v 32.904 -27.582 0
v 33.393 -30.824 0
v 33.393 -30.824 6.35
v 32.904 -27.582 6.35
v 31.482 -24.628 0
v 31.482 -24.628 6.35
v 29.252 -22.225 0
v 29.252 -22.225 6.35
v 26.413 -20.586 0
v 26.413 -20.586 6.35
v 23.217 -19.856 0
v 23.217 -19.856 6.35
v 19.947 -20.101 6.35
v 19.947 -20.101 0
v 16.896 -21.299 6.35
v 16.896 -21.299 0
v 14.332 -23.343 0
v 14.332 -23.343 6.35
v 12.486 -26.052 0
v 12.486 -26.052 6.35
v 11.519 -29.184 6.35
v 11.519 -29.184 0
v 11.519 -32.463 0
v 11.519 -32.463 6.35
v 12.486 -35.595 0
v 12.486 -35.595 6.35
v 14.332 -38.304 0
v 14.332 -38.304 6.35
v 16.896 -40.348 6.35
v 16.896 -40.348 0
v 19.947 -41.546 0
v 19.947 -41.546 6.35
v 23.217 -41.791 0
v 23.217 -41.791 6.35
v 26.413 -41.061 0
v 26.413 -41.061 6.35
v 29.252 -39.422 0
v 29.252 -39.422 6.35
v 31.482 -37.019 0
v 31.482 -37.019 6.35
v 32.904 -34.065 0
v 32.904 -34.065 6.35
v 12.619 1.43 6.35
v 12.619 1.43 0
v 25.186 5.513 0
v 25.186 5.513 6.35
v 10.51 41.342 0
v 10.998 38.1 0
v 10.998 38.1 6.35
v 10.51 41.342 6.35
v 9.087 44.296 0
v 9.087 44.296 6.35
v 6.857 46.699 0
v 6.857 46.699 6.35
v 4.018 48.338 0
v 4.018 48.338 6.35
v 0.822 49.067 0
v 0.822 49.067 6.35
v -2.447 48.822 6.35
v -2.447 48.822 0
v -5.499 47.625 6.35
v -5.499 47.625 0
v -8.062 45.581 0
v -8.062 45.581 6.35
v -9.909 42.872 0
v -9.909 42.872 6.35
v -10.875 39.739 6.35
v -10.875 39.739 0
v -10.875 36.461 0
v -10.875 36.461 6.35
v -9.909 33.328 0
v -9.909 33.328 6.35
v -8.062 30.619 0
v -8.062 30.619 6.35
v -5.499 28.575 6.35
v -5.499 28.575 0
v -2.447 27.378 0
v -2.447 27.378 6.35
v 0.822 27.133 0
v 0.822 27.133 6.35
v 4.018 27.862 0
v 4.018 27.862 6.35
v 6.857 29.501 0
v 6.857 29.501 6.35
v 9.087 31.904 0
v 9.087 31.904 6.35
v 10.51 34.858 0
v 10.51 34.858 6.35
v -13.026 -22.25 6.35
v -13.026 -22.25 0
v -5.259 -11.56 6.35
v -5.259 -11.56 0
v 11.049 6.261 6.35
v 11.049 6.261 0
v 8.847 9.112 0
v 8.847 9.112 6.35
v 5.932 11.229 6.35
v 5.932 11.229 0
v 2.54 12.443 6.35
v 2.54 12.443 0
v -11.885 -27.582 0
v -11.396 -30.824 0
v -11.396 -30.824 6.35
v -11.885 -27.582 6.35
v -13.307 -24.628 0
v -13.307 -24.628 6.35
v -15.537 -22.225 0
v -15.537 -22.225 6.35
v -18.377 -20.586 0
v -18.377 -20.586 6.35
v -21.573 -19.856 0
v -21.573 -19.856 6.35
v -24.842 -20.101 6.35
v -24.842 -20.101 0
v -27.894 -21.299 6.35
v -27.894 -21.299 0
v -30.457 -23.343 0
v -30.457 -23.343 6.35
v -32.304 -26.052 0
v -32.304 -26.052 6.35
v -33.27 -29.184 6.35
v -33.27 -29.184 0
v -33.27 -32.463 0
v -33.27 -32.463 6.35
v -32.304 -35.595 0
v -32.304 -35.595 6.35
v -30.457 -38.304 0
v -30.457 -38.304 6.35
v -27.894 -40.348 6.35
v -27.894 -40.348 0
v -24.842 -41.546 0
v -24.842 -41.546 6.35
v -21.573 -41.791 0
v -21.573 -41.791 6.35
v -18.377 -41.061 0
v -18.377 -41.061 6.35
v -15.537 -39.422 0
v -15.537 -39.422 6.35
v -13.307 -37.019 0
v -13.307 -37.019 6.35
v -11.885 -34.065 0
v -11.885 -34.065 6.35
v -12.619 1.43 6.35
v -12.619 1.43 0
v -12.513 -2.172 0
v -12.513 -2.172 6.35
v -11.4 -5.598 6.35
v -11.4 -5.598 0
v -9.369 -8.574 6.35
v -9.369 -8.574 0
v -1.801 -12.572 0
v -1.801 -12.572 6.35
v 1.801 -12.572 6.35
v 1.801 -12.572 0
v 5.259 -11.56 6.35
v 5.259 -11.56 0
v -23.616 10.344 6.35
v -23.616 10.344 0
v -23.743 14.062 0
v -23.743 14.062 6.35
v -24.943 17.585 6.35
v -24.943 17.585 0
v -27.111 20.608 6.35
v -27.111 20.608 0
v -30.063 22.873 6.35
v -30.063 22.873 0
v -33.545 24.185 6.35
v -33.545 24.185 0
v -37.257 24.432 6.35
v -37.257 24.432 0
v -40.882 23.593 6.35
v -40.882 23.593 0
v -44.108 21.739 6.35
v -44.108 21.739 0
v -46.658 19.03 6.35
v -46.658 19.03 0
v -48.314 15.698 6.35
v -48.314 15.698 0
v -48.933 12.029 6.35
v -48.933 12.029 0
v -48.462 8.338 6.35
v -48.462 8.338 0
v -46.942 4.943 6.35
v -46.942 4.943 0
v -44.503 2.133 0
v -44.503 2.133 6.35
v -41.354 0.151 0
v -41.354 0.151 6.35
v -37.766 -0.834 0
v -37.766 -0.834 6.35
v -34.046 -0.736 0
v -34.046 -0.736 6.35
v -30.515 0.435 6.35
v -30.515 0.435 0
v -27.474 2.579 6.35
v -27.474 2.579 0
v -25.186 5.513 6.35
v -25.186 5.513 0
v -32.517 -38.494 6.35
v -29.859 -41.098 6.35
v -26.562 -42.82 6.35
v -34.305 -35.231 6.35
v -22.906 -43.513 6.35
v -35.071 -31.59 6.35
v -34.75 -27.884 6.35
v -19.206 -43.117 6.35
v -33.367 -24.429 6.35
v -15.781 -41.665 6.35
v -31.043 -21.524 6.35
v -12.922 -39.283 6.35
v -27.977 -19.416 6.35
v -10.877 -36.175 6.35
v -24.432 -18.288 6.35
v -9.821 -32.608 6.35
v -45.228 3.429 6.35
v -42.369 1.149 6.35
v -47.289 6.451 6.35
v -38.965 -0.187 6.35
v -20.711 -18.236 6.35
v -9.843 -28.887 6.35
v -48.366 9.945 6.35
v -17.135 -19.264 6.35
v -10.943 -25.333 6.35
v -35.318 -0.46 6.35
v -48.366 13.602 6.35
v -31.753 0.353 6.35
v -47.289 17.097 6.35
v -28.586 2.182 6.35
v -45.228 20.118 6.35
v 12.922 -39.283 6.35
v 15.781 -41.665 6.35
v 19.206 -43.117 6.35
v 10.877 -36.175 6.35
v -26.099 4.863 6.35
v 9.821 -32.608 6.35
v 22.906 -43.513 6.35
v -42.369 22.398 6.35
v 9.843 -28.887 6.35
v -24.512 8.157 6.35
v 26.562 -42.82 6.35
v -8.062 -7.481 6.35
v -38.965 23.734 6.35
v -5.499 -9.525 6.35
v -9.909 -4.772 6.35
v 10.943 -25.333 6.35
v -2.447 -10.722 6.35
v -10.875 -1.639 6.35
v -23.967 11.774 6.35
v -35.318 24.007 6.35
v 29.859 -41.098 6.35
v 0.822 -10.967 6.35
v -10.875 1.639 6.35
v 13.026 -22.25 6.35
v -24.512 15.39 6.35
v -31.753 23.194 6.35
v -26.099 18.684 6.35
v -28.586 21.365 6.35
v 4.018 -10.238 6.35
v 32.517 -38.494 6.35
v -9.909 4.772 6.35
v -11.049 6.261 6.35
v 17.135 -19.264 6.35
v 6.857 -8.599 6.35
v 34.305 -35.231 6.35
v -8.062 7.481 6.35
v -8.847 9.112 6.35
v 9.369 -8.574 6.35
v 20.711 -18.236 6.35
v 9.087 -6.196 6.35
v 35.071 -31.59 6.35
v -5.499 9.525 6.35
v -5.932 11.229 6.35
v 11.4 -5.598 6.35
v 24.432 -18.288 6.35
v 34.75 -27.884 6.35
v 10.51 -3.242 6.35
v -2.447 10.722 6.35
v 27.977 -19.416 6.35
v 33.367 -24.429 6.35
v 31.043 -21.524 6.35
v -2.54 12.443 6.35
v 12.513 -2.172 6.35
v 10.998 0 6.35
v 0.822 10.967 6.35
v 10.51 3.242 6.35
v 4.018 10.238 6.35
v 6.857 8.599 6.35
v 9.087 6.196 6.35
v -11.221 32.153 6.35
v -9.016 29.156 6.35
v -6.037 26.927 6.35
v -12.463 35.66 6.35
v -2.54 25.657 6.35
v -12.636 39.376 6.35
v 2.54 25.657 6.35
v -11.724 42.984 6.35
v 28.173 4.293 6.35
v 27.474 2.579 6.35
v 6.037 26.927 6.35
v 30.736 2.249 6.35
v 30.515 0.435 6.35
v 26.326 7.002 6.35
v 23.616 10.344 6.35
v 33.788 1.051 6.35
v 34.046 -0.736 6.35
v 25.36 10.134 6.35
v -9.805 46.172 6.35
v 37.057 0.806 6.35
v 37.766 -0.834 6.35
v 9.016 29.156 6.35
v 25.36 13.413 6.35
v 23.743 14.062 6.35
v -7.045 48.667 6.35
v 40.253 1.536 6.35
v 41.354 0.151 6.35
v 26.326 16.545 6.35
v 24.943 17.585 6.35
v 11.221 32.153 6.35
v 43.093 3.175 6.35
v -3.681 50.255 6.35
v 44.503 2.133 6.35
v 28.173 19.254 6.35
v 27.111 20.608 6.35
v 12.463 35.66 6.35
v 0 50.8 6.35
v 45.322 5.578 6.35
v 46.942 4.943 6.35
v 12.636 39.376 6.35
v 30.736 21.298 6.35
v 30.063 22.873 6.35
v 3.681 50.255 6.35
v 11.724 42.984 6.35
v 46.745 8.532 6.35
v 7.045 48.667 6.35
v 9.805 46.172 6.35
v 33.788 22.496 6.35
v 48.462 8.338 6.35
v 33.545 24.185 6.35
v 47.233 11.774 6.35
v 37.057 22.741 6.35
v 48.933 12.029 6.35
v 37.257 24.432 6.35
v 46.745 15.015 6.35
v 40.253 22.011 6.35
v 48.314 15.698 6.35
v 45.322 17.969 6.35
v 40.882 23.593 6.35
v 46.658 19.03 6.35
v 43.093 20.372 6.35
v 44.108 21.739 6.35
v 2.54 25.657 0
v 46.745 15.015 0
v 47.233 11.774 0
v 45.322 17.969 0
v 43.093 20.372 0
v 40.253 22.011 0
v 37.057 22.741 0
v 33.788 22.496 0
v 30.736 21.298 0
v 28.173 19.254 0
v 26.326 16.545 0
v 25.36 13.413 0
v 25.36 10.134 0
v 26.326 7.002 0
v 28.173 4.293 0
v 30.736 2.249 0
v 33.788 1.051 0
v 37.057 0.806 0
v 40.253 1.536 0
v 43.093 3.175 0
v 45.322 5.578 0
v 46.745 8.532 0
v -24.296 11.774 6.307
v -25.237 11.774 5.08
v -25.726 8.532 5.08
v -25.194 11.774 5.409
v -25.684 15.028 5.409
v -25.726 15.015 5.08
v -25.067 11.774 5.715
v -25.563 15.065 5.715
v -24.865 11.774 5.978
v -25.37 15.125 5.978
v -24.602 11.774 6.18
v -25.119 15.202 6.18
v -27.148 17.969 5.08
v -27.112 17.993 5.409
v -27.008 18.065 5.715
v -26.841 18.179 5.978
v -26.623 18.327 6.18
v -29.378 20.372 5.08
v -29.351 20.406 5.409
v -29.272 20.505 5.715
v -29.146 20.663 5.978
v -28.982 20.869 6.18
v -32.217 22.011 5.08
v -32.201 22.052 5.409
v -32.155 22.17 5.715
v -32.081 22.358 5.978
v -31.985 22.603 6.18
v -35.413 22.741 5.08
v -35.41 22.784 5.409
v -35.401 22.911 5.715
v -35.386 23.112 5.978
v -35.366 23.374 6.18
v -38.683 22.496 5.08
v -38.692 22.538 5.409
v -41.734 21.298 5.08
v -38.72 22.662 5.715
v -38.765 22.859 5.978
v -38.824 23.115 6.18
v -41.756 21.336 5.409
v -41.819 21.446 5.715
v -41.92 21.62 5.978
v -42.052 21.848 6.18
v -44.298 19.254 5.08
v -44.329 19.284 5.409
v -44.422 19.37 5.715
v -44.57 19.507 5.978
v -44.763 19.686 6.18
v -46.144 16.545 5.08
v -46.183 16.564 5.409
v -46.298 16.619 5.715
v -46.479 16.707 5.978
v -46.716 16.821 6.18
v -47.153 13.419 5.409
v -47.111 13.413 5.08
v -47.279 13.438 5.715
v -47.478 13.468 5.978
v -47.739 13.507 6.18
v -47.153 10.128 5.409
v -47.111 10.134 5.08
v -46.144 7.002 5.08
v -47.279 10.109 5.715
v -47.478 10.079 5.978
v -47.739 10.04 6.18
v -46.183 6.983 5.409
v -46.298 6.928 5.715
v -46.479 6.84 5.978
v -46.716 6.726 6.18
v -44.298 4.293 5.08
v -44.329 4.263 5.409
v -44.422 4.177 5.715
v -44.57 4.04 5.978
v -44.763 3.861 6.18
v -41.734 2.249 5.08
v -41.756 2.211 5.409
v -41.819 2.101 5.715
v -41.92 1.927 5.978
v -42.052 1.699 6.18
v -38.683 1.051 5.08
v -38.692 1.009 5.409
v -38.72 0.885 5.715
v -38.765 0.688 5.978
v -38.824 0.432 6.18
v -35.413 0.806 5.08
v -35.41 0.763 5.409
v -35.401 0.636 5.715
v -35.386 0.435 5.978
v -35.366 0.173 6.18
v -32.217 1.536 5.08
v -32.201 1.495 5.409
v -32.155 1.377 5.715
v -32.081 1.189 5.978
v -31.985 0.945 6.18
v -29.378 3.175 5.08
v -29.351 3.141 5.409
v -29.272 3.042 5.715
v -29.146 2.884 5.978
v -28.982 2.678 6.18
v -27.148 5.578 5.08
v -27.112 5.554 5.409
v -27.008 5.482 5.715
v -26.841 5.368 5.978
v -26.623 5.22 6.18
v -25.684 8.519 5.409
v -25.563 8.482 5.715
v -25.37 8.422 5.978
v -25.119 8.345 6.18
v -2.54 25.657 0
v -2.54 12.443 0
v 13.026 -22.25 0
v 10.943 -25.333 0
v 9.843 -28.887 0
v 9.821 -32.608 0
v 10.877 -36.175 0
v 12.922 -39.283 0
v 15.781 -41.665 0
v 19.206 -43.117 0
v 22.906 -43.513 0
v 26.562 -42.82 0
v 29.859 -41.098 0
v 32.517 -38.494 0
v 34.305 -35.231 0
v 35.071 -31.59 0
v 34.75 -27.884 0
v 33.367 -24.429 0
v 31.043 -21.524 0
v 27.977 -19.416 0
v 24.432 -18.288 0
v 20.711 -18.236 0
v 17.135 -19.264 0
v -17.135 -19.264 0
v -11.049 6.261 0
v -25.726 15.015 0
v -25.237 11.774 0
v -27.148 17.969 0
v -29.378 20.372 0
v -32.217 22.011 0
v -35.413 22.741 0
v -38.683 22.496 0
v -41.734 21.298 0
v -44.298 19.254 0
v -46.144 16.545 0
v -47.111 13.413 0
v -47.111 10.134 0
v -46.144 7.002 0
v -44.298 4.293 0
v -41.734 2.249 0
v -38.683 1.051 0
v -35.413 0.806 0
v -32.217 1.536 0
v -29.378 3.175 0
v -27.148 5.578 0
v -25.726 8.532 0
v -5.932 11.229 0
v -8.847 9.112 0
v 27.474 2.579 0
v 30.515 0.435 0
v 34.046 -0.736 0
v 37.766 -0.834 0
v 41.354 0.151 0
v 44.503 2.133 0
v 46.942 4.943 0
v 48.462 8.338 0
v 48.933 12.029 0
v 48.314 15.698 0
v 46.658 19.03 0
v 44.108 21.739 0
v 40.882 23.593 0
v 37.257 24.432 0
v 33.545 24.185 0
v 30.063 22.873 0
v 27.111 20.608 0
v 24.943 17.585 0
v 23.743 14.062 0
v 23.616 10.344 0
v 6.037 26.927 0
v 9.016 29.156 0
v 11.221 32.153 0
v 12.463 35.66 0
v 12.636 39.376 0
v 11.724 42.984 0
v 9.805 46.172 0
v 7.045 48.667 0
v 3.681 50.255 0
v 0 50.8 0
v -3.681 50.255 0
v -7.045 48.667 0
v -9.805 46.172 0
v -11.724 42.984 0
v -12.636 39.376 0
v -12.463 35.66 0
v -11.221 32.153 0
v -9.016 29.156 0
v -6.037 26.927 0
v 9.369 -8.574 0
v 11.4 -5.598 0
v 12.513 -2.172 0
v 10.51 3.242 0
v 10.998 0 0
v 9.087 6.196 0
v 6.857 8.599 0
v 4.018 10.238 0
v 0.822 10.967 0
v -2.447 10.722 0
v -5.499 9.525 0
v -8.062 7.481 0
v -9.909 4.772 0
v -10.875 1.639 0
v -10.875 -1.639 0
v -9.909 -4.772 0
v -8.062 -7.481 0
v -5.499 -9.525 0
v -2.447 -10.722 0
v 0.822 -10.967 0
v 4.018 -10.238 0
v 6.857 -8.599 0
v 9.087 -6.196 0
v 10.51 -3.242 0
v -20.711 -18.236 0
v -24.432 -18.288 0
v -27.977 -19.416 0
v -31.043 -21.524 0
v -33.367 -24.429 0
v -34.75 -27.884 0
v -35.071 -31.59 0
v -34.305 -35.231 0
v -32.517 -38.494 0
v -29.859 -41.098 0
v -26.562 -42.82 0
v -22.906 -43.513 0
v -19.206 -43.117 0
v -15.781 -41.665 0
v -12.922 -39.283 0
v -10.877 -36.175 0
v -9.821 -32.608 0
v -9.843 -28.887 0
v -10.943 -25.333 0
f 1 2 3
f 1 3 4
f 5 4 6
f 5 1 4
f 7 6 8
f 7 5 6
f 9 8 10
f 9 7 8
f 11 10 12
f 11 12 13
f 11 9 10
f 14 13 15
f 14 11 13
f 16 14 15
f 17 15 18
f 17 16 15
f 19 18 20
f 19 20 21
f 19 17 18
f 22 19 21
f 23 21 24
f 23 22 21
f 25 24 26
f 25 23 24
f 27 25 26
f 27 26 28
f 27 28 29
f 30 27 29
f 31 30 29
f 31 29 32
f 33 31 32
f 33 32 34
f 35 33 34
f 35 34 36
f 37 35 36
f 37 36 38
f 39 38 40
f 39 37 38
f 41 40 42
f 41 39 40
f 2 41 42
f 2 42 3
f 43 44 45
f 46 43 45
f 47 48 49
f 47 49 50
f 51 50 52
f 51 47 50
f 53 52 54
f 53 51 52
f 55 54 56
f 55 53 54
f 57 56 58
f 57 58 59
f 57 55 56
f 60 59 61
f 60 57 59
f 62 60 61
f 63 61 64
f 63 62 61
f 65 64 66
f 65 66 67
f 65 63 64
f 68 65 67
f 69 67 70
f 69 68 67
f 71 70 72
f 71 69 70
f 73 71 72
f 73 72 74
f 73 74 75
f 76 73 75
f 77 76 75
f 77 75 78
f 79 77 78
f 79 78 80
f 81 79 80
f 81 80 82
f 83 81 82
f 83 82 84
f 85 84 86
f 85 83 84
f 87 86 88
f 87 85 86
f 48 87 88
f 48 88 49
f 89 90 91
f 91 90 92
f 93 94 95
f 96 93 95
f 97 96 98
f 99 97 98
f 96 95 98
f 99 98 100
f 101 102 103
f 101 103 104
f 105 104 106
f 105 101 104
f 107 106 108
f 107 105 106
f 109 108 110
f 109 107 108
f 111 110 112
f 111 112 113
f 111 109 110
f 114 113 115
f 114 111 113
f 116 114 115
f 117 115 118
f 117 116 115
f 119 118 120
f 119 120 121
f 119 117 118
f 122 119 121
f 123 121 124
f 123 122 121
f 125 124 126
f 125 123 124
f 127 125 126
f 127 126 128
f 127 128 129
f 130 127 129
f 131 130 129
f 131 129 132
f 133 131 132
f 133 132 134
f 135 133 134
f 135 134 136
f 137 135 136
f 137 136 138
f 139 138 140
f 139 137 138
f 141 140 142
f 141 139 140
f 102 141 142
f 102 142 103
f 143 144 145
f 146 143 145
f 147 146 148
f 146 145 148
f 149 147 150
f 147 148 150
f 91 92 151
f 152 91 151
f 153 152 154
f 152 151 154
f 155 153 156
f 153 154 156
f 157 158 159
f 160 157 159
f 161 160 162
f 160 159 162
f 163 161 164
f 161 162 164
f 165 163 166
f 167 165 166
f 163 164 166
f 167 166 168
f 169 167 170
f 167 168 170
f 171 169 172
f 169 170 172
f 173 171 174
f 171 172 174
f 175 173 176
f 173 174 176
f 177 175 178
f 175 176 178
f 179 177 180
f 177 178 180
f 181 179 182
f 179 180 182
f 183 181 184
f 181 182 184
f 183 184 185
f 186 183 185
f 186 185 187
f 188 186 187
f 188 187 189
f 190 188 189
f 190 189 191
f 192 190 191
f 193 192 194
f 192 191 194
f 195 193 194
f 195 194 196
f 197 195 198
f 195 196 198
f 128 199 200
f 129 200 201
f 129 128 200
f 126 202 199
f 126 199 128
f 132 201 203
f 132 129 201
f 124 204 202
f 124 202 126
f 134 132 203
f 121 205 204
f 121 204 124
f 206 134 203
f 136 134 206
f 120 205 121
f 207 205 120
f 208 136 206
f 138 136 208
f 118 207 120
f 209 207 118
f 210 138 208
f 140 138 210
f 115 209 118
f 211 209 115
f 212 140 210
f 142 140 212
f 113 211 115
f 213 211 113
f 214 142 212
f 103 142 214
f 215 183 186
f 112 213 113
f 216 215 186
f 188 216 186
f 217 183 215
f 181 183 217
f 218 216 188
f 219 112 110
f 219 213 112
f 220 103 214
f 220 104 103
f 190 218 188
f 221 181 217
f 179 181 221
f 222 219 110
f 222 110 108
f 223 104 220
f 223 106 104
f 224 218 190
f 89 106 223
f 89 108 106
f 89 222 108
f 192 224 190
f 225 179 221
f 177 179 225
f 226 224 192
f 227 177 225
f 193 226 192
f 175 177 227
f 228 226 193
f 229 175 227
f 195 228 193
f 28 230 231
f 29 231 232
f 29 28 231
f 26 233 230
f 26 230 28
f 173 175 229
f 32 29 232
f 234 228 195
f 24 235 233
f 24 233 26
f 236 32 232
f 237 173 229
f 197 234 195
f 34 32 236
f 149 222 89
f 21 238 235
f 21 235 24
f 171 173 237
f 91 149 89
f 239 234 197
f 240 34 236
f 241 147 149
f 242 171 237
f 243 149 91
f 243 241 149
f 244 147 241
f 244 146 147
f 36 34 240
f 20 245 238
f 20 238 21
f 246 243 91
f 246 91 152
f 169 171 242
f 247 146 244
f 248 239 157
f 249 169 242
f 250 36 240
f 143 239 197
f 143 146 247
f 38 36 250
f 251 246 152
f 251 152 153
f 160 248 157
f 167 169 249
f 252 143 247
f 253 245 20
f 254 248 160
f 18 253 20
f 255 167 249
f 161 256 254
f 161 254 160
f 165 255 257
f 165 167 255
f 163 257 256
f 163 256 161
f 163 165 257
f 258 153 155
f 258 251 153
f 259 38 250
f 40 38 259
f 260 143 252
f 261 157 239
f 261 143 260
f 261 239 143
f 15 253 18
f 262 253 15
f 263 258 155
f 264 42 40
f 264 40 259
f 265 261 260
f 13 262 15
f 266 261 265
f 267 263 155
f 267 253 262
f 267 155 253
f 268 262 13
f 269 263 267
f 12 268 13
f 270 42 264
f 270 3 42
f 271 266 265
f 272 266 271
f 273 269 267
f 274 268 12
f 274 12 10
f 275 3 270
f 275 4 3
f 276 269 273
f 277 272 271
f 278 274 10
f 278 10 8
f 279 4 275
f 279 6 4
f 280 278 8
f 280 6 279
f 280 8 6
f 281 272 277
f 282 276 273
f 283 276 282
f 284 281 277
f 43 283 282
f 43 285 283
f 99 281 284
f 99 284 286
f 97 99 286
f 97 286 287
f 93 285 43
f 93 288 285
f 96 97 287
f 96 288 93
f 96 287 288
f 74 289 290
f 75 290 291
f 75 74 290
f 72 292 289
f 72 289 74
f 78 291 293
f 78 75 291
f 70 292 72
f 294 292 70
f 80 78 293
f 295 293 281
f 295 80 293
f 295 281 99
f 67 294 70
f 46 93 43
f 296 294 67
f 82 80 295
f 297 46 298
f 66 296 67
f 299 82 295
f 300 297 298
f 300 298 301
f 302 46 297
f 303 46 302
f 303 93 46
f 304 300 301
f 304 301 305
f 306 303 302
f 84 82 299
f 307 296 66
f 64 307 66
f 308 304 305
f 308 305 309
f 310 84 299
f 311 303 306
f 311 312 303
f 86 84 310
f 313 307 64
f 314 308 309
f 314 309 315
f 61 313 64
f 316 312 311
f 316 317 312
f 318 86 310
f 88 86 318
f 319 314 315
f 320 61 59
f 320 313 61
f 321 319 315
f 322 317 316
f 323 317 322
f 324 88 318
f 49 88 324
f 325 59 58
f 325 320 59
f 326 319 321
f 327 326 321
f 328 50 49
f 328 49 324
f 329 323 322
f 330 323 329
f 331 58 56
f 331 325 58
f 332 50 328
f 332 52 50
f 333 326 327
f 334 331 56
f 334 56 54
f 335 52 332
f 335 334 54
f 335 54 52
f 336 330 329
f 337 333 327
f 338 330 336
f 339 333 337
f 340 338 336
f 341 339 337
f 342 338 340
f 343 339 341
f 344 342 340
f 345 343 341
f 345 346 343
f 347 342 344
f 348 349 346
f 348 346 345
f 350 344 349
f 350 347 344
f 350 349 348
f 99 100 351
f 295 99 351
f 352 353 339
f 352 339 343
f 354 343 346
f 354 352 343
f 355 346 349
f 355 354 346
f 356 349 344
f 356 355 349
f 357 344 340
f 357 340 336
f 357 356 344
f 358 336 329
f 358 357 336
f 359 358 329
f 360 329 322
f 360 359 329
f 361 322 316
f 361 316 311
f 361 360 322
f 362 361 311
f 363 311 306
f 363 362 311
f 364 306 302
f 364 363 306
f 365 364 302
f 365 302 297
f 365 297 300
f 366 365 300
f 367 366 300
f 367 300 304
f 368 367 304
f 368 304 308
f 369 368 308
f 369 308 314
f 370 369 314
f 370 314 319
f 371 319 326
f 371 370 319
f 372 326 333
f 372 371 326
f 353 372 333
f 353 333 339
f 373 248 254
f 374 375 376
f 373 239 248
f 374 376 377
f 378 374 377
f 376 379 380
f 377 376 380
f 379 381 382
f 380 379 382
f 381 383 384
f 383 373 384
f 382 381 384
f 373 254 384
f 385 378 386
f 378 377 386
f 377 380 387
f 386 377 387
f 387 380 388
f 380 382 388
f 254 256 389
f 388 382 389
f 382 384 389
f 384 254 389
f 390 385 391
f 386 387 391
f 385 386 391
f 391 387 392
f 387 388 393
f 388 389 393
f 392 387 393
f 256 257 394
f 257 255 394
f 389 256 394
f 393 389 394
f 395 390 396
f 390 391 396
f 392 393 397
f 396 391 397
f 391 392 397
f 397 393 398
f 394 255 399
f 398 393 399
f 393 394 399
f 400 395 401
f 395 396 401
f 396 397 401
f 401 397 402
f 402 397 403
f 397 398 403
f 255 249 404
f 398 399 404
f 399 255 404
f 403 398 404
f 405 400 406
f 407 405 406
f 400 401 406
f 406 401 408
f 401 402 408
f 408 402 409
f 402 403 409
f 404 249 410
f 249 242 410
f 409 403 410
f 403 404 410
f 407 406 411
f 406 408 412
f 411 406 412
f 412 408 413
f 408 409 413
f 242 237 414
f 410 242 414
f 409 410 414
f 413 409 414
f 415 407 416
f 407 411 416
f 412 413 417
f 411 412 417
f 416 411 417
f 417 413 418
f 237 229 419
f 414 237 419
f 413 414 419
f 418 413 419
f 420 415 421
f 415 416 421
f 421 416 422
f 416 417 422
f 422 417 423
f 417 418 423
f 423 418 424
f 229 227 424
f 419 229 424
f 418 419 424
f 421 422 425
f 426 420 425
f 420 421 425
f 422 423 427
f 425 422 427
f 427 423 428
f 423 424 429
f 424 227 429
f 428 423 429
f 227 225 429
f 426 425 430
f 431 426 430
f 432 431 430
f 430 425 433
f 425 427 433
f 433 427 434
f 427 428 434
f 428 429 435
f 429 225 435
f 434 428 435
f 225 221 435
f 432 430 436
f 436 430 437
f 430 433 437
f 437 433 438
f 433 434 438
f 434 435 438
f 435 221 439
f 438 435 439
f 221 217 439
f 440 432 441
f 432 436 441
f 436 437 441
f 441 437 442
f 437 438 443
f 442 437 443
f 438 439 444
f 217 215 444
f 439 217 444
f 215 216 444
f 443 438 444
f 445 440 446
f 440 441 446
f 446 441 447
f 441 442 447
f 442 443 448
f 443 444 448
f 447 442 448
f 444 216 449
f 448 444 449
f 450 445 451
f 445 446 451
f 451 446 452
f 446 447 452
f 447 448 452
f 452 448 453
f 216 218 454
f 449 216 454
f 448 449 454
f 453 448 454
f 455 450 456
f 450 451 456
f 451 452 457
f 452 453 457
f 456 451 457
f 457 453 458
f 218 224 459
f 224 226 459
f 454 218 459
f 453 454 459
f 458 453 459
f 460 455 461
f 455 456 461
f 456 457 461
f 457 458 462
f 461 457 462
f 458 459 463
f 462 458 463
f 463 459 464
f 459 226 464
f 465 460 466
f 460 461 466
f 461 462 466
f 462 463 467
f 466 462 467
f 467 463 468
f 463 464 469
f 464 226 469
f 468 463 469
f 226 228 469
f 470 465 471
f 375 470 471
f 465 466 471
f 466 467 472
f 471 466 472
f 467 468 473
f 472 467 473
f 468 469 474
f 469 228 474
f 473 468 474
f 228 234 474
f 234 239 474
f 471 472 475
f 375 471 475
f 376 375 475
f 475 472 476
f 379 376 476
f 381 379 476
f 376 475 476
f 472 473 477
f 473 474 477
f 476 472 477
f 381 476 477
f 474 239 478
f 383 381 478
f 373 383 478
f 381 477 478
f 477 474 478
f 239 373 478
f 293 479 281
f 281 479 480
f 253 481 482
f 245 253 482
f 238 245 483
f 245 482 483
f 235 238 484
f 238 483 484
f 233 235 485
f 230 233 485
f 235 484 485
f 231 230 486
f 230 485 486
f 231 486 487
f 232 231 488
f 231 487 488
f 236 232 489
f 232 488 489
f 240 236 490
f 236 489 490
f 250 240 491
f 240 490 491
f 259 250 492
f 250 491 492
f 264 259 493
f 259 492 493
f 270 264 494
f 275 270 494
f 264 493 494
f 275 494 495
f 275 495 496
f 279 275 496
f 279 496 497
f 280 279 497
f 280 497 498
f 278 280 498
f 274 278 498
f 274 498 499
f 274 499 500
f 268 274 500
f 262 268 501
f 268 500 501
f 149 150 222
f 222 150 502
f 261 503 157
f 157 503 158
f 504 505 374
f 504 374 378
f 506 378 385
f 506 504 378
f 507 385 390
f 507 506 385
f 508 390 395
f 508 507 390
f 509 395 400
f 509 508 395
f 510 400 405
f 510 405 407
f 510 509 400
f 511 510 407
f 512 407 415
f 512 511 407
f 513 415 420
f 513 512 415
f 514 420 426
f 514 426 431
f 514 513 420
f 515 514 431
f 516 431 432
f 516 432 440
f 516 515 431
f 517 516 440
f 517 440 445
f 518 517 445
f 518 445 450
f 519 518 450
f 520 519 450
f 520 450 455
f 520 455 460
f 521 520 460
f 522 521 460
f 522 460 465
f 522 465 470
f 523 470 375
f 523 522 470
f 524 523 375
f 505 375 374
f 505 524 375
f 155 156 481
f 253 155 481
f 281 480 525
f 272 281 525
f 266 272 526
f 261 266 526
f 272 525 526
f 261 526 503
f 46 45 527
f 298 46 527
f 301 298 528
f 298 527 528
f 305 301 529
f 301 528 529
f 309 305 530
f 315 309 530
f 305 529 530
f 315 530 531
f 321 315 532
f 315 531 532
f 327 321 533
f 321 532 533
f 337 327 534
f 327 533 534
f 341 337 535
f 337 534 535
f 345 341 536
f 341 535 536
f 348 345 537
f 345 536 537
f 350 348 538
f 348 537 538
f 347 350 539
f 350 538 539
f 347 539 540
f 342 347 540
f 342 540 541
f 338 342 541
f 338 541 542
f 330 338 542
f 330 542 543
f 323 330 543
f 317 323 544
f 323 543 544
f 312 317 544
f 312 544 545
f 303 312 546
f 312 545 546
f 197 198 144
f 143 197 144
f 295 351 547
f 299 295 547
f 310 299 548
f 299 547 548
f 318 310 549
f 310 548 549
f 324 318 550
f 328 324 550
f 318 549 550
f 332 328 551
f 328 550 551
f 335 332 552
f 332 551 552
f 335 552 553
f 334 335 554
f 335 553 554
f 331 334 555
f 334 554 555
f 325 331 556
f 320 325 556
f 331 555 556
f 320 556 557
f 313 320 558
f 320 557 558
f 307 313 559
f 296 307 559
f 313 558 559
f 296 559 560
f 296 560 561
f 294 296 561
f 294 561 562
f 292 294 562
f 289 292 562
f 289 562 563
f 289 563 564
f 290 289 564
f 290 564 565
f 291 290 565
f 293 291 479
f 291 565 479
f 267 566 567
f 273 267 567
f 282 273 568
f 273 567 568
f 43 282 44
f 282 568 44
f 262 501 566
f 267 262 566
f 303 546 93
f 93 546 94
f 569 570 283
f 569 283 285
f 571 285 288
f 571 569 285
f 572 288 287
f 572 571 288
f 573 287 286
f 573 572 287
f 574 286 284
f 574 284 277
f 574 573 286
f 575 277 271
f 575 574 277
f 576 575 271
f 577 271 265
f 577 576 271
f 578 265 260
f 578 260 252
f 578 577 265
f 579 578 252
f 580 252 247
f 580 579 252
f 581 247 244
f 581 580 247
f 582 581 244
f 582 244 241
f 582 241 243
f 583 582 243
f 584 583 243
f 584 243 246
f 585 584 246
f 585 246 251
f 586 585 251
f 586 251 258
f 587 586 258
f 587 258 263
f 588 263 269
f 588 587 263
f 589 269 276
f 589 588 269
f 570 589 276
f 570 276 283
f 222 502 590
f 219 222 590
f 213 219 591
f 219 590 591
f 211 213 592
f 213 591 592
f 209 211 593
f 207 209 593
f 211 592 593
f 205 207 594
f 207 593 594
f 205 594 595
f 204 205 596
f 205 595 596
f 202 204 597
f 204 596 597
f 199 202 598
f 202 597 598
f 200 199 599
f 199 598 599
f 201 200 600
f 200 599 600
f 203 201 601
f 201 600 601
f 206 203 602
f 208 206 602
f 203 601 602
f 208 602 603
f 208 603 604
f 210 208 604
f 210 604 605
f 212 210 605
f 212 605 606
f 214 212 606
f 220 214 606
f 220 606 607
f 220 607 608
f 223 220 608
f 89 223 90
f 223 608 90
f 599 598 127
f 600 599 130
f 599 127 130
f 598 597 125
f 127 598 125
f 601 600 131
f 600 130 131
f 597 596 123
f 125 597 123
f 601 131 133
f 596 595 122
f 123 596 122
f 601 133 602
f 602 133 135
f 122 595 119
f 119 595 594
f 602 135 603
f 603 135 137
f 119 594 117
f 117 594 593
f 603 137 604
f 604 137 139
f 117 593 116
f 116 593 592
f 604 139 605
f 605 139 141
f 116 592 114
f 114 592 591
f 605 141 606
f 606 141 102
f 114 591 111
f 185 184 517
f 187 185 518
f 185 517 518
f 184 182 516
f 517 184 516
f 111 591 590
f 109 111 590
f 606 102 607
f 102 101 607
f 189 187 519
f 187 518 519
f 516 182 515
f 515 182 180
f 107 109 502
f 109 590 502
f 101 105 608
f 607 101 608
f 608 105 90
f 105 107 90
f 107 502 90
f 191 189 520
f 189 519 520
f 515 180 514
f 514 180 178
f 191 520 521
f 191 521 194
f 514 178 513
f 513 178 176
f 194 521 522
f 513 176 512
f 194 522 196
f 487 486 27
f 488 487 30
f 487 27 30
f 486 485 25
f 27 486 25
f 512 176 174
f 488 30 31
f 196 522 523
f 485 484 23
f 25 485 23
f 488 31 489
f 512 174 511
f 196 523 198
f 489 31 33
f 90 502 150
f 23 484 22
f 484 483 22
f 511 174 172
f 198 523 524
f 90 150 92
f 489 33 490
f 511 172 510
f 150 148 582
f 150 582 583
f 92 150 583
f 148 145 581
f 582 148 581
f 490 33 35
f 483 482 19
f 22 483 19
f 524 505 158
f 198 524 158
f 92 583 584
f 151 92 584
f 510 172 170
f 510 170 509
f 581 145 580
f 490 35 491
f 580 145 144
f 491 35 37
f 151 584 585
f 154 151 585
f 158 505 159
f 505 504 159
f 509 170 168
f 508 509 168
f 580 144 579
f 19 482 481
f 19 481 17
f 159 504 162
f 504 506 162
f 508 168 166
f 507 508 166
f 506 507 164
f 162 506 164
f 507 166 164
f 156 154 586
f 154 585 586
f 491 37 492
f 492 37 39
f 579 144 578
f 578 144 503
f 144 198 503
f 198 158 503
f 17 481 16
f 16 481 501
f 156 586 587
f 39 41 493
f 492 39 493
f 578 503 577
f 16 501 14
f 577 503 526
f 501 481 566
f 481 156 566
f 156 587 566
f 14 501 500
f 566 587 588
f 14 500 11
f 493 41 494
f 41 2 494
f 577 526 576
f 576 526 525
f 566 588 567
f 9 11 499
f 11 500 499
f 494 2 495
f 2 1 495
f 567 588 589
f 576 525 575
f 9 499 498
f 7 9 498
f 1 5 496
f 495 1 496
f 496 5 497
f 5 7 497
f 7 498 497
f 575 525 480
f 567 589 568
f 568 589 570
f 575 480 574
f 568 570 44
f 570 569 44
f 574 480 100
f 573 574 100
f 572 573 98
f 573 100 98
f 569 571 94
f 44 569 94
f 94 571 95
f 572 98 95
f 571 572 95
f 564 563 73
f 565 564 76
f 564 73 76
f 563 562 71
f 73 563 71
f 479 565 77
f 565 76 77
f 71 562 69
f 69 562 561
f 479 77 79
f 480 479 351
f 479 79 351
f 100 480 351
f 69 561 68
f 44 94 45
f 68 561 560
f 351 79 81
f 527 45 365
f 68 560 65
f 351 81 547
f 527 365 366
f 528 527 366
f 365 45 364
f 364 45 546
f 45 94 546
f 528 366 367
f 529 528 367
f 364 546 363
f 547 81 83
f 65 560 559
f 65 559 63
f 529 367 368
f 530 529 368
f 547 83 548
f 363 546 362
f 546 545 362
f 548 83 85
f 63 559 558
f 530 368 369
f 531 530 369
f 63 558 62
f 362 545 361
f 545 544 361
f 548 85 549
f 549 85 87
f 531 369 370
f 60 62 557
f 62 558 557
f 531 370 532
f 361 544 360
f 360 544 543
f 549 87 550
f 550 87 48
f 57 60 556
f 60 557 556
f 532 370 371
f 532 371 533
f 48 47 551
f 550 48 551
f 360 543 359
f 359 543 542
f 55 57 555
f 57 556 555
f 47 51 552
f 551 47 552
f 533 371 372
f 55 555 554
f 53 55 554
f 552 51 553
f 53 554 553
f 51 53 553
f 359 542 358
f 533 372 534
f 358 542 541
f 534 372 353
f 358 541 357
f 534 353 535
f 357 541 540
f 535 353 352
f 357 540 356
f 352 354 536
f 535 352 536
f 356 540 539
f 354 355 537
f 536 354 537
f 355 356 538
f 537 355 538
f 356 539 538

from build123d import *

# Parameters (mm, degrees)
F0_R     = 10.9982
F1_DEPTH = 6.35
F2_R     = 1.27


with BuildPart() as f1:
    # F0 (on Top) → F1 (new body)
    with BuildSketch(Plane.XY):
        with BuildLine():
            Line((-2.54, 25.656592), (-2.54, 12.443408))
            ThreePointArc((-2.54, 12.443408), (-7.464873, 10.274516), (-11.049481, 6.260908))
            Line((-11.049481, 6.260908), (-23.615966, 10.344007))
            ThreePointArc((-23.615966, 10.344007), (-48.313671, 15.698063), (-25.185772, 5.512639))
            Line((-25.185772, 5.512639), (-12.619287, 1.429541))
            ThreePointArc((-12.619287, 1.429541), (-12.078418, -3.924516), (-9.368955, -8.573954))
            Line((-9.368955, -8.573954), (-17.13547, -19.263644))
            ThreePointArc((-17.13547, -19.263644), (-29.859491, -41.098063), (-13.025663, -22.249594))
            Line((-13.025663, -22.249594), (-5.259148, -11.559903))
            ThreePointArc((-5.259148, -11.559903), (0, -12.7), (5.259148, -11.559903))
            Line((5.259148, -11.559903), (13.025663, -22.249594))
            ThreePointArc((13.025663, -22.249594), (29.859491, -41.098063), (17.13547, -19.263644))
            Line((17.13547, -19.263644), (9.368955, -8.573954))
            ThreePointArc((9.368955, -8.573954), (12.078418, -3.924516), (12.619287, 1.429541))
            Line((12.619287, 1.429541), (25.185772, 5.512639))
            ThreePointArc((25.185772, 5.512639), (48.313671, 15.698063), (23.615966, 10.344007))
            Line((23.615966, 10.344007), (11.049481, 6.260908))
            ThreePointArc((11.049481, 6.260908), (7.464873, 10.274516), (2.54, 12.443408))
            Line((2.54, 12.443408), (2.54, 25.656592))
            ThreePointArc((2.54, 25.656592), (0, 50.8), (-2.54, 25.656592))
        make_face()
        with Locations((-22.394618, -30.823547)):
            Circle(F0_R, mode=Mode.SUBTRACT)
        Circle(F0_R, mode=Mode.SUBTRACT)
        with Locations((22.394618, -30.823547)):
            Circle(F0_R, mode=Mode.SUBTRACT)
        with Locations((-36.235253, 11.773547)):
            Circle(F0_R, mode=Mode.SUBTRACT)
        with Locations((0, 38.1)):
            Circle(F0_R, mode=Mode.SUBTRACT)
        with Locations((36.235253, 11.773547)):
            Circle(F0_R, mode=Mode.SUBTRACT)
    extrude(amount=F1_DEPTH)

    # F2
    f2_edges = [f1.edges().sort_by_distance(p)[0] for p in [
        (-47.233453, 11.773547, 6.35),
    ]]
    fillet(f2_edges, radius=F2_R)


solid = f1.part
